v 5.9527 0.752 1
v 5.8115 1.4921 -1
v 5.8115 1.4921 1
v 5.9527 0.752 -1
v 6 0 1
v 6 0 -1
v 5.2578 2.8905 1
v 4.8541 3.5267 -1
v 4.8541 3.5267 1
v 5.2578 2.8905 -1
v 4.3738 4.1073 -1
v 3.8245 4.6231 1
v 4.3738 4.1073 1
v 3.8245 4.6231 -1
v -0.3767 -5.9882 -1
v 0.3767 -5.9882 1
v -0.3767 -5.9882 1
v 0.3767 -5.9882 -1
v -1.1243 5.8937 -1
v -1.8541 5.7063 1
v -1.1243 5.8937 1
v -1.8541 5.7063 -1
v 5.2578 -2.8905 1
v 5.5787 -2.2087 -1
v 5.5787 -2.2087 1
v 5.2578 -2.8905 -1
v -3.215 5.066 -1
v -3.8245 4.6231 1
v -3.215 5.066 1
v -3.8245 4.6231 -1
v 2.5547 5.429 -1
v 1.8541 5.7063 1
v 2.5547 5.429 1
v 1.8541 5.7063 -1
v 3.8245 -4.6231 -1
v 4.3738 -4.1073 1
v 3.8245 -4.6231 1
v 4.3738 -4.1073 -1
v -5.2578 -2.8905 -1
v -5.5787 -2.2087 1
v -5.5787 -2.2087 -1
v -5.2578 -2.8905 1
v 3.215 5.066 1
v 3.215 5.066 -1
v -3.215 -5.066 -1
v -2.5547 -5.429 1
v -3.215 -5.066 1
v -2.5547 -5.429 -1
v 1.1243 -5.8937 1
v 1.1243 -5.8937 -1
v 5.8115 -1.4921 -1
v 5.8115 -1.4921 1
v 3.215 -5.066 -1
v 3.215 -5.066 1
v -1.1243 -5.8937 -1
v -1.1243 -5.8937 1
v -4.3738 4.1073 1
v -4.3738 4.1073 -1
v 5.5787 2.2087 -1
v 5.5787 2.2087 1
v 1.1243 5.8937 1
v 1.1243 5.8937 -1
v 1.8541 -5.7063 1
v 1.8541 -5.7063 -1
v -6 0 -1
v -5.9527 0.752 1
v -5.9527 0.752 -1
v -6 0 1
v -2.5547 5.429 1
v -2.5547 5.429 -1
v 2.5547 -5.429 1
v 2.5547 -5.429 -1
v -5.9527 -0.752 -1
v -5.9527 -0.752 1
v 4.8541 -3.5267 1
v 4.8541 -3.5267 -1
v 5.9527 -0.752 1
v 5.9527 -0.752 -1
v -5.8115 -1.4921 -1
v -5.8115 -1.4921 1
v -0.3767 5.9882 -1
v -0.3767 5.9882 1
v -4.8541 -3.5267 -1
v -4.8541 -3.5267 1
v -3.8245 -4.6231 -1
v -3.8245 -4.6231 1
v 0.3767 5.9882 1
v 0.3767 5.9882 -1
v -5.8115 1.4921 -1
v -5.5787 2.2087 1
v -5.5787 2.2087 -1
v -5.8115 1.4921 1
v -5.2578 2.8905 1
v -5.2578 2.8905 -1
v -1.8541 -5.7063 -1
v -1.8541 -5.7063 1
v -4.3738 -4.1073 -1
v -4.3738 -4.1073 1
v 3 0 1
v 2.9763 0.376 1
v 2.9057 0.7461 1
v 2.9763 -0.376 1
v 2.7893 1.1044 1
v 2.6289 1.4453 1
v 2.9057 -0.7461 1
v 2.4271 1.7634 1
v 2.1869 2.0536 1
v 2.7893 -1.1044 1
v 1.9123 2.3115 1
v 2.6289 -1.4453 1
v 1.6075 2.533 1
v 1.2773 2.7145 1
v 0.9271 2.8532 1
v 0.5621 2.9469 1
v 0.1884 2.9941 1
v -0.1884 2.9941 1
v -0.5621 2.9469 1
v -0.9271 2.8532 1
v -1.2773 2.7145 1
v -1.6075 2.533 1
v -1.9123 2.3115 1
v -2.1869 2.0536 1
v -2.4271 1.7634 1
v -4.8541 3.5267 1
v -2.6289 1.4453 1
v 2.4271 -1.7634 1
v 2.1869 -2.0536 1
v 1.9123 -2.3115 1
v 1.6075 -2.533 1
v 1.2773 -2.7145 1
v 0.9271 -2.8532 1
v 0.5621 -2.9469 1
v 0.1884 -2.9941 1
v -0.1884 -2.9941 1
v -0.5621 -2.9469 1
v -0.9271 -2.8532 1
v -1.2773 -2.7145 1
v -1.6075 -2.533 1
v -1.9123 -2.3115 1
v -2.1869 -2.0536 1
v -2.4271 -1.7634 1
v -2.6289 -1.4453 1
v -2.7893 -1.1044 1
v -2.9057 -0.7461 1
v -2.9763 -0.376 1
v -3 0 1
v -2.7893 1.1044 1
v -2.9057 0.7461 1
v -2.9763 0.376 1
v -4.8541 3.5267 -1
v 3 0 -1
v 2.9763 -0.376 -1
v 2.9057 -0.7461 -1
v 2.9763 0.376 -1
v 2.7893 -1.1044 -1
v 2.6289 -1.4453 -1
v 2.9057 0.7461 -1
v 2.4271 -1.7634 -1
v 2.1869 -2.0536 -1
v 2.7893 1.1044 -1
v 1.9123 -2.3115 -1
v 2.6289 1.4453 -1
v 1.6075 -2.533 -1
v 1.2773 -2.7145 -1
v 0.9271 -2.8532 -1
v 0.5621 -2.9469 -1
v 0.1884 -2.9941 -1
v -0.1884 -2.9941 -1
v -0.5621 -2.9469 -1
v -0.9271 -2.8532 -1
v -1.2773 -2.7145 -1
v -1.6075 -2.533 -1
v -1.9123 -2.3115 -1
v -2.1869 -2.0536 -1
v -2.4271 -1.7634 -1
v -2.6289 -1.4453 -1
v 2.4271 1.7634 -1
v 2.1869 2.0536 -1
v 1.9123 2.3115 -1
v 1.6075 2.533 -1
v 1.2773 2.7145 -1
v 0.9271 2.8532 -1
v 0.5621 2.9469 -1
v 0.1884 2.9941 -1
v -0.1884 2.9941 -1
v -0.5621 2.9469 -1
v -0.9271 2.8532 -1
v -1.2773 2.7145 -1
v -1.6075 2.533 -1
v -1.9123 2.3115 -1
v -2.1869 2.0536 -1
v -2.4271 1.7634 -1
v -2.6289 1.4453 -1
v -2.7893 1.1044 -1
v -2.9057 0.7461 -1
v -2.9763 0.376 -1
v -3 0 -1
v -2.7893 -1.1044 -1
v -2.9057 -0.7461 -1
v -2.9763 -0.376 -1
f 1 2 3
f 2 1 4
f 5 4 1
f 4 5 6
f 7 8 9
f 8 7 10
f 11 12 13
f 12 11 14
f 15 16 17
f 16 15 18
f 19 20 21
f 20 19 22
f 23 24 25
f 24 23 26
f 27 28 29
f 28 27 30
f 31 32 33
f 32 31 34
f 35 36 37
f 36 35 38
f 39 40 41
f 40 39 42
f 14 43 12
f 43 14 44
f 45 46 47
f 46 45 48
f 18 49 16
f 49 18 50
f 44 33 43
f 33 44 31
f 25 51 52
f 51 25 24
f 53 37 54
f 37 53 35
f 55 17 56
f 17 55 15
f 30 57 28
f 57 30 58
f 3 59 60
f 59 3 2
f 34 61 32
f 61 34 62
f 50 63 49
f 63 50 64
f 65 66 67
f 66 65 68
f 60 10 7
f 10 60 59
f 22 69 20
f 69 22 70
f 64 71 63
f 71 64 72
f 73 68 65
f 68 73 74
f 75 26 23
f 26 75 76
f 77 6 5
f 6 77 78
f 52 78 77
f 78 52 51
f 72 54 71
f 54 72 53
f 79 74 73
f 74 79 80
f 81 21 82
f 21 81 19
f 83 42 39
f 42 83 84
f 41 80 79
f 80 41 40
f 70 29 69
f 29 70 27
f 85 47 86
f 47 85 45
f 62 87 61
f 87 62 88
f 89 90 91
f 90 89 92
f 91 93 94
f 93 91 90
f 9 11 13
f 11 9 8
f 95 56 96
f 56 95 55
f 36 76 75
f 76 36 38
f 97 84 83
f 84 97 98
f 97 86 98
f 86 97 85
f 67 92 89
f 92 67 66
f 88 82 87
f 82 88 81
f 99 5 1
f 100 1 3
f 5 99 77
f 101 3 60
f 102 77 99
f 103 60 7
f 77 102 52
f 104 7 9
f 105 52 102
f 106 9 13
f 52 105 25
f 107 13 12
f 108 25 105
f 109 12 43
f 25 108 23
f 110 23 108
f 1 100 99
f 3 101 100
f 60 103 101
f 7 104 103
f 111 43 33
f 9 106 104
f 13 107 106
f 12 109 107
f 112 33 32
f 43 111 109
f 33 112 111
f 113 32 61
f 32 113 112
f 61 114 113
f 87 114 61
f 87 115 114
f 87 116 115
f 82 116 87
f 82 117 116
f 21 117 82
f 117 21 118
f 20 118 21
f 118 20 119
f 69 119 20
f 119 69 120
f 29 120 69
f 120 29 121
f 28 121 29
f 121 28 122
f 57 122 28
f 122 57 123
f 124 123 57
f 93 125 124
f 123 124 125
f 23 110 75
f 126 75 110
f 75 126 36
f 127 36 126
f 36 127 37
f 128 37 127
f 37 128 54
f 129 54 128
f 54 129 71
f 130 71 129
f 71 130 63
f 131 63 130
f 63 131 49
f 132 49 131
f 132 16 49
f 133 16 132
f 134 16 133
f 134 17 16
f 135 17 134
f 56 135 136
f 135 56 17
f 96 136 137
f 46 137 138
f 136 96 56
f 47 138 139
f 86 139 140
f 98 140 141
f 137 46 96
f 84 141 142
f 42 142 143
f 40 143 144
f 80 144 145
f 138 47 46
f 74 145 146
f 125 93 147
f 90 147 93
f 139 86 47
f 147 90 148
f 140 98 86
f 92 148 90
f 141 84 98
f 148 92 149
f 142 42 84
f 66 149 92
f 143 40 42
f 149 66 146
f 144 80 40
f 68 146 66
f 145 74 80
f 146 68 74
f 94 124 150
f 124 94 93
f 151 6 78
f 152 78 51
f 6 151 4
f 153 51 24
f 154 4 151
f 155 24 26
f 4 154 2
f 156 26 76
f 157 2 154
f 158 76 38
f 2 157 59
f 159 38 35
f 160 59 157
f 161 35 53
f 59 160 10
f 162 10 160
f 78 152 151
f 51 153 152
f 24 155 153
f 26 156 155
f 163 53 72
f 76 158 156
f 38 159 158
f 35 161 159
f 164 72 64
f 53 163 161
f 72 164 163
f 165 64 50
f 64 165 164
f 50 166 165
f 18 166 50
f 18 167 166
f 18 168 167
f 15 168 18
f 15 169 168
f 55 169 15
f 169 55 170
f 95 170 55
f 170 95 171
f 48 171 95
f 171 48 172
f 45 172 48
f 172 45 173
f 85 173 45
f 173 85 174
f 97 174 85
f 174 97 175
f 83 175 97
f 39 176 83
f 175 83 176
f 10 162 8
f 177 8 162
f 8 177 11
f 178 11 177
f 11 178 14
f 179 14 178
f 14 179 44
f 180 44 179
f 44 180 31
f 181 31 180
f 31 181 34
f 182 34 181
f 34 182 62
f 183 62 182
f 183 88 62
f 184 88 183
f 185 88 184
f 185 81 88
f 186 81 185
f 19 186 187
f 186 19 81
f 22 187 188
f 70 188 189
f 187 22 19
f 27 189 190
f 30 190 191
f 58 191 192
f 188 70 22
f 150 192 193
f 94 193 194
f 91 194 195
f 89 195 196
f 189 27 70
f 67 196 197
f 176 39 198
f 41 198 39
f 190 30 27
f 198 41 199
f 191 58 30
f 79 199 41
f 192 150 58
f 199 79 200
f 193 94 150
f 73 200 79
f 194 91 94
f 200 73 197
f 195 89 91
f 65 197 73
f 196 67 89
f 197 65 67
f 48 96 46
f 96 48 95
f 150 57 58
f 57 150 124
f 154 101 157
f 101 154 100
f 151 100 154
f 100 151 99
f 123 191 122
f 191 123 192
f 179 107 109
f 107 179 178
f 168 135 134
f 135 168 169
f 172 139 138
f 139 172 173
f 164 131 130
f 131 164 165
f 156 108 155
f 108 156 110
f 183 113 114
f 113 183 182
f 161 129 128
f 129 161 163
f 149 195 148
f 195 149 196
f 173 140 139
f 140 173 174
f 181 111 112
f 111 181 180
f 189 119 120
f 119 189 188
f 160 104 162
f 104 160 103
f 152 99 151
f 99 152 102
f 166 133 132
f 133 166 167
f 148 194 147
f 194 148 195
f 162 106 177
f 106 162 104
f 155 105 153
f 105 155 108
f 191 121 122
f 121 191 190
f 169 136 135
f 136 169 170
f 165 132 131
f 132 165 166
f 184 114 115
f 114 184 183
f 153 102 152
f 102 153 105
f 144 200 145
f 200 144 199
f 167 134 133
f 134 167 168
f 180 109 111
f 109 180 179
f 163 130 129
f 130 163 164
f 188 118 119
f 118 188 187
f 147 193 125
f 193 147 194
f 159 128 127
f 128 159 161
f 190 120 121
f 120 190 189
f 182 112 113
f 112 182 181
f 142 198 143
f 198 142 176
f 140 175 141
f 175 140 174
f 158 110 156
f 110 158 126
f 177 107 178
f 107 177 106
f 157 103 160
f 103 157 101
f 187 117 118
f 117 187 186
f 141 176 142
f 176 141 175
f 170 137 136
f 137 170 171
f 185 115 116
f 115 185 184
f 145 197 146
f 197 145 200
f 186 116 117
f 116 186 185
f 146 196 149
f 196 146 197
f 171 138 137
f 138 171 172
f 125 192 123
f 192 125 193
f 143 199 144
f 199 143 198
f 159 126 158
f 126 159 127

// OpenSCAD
$fn = 50;


difference() {
	union() {
		translate(v = [0, 0, -1.0000000000]) {
			cylinder(h = 2, r = 6.0000000000);
		}
	}
	union() {
		translate(v = [0, 0, -100.0000000000]) {
			cylinder(h = 200, r = 3.0000000000);
		}
	}
}
